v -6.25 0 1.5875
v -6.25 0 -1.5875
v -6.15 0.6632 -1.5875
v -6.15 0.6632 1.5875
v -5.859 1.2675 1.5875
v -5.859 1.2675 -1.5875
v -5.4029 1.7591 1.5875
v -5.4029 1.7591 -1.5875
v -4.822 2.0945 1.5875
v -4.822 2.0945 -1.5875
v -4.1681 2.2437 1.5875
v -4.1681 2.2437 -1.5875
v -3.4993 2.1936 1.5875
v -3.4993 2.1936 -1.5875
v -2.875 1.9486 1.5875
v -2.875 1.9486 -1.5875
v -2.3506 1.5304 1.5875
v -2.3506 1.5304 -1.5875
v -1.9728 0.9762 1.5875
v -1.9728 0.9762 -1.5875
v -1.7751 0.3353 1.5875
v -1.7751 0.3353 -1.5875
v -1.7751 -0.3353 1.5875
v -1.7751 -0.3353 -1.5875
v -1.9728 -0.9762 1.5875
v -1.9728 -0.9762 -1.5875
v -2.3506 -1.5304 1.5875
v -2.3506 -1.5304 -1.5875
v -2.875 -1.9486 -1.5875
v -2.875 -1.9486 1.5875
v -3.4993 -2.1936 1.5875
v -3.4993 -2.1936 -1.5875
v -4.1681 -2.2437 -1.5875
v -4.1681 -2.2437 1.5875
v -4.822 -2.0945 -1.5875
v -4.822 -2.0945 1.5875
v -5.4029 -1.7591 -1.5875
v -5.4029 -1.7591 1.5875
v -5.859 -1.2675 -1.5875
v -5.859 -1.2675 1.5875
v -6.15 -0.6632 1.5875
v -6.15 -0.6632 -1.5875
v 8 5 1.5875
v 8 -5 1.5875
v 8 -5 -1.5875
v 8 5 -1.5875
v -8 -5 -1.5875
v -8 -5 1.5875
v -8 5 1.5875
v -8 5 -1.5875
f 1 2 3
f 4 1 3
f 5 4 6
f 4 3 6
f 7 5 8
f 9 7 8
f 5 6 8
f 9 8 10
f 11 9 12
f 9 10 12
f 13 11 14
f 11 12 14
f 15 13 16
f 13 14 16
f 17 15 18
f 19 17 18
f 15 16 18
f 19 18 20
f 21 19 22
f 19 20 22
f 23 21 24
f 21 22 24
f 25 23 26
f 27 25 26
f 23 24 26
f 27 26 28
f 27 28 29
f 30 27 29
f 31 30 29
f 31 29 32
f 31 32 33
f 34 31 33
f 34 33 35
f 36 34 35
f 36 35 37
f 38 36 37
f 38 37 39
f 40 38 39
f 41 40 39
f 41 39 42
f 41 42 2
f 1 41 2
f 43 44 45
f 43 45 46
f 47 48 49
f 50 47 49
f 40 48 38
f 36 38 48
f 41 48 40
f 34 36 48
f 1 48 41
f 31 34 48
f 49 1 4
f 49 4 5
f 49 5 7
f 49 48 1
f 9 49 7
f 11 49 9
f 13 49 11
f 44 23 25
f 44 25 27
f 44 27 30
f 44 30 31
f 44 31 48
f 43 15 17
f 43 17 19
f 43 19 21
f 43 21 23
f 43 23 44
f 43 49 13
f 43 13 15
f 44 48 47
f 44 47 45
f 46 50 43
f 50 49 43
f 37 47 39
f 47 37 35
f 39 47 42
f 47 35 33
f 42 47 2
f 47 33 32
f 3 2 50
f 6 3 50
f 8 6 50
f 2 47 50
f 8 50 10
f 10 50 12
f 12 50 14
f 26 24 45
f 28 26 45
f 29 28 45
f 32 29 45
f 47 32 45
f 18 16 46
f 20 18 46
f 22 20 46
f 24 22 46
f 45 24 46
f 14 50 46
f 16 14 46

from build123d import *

# Parameters (mm, degrees)
SKETCH1_W            = 16
SKETCH1_H            = 10
BOSS_EXTRUDE1_DEPTH  = 1.5875
M4_CLEARANCE_HOLE1_D = 4.5


with BuildPart() as part:
    # Sketch1 → Boss-Extrude1 (new body, symmetric)
    with BuildSketch(Plane.XY):
        Rectangle(SKETCH1_W, SKETCH1_H)
    extrude(amount=BOSS_EXTRUDE1_DEPTH, both=True)

    # M4 Clearance Hole1 (through all)
    with Locations(Plane.XY.offset(1.5875)):
        with Locations((-4, 0)):
            Hole(M4_CLEARANCE_HOLE1_D / 2)


solid = part.part
